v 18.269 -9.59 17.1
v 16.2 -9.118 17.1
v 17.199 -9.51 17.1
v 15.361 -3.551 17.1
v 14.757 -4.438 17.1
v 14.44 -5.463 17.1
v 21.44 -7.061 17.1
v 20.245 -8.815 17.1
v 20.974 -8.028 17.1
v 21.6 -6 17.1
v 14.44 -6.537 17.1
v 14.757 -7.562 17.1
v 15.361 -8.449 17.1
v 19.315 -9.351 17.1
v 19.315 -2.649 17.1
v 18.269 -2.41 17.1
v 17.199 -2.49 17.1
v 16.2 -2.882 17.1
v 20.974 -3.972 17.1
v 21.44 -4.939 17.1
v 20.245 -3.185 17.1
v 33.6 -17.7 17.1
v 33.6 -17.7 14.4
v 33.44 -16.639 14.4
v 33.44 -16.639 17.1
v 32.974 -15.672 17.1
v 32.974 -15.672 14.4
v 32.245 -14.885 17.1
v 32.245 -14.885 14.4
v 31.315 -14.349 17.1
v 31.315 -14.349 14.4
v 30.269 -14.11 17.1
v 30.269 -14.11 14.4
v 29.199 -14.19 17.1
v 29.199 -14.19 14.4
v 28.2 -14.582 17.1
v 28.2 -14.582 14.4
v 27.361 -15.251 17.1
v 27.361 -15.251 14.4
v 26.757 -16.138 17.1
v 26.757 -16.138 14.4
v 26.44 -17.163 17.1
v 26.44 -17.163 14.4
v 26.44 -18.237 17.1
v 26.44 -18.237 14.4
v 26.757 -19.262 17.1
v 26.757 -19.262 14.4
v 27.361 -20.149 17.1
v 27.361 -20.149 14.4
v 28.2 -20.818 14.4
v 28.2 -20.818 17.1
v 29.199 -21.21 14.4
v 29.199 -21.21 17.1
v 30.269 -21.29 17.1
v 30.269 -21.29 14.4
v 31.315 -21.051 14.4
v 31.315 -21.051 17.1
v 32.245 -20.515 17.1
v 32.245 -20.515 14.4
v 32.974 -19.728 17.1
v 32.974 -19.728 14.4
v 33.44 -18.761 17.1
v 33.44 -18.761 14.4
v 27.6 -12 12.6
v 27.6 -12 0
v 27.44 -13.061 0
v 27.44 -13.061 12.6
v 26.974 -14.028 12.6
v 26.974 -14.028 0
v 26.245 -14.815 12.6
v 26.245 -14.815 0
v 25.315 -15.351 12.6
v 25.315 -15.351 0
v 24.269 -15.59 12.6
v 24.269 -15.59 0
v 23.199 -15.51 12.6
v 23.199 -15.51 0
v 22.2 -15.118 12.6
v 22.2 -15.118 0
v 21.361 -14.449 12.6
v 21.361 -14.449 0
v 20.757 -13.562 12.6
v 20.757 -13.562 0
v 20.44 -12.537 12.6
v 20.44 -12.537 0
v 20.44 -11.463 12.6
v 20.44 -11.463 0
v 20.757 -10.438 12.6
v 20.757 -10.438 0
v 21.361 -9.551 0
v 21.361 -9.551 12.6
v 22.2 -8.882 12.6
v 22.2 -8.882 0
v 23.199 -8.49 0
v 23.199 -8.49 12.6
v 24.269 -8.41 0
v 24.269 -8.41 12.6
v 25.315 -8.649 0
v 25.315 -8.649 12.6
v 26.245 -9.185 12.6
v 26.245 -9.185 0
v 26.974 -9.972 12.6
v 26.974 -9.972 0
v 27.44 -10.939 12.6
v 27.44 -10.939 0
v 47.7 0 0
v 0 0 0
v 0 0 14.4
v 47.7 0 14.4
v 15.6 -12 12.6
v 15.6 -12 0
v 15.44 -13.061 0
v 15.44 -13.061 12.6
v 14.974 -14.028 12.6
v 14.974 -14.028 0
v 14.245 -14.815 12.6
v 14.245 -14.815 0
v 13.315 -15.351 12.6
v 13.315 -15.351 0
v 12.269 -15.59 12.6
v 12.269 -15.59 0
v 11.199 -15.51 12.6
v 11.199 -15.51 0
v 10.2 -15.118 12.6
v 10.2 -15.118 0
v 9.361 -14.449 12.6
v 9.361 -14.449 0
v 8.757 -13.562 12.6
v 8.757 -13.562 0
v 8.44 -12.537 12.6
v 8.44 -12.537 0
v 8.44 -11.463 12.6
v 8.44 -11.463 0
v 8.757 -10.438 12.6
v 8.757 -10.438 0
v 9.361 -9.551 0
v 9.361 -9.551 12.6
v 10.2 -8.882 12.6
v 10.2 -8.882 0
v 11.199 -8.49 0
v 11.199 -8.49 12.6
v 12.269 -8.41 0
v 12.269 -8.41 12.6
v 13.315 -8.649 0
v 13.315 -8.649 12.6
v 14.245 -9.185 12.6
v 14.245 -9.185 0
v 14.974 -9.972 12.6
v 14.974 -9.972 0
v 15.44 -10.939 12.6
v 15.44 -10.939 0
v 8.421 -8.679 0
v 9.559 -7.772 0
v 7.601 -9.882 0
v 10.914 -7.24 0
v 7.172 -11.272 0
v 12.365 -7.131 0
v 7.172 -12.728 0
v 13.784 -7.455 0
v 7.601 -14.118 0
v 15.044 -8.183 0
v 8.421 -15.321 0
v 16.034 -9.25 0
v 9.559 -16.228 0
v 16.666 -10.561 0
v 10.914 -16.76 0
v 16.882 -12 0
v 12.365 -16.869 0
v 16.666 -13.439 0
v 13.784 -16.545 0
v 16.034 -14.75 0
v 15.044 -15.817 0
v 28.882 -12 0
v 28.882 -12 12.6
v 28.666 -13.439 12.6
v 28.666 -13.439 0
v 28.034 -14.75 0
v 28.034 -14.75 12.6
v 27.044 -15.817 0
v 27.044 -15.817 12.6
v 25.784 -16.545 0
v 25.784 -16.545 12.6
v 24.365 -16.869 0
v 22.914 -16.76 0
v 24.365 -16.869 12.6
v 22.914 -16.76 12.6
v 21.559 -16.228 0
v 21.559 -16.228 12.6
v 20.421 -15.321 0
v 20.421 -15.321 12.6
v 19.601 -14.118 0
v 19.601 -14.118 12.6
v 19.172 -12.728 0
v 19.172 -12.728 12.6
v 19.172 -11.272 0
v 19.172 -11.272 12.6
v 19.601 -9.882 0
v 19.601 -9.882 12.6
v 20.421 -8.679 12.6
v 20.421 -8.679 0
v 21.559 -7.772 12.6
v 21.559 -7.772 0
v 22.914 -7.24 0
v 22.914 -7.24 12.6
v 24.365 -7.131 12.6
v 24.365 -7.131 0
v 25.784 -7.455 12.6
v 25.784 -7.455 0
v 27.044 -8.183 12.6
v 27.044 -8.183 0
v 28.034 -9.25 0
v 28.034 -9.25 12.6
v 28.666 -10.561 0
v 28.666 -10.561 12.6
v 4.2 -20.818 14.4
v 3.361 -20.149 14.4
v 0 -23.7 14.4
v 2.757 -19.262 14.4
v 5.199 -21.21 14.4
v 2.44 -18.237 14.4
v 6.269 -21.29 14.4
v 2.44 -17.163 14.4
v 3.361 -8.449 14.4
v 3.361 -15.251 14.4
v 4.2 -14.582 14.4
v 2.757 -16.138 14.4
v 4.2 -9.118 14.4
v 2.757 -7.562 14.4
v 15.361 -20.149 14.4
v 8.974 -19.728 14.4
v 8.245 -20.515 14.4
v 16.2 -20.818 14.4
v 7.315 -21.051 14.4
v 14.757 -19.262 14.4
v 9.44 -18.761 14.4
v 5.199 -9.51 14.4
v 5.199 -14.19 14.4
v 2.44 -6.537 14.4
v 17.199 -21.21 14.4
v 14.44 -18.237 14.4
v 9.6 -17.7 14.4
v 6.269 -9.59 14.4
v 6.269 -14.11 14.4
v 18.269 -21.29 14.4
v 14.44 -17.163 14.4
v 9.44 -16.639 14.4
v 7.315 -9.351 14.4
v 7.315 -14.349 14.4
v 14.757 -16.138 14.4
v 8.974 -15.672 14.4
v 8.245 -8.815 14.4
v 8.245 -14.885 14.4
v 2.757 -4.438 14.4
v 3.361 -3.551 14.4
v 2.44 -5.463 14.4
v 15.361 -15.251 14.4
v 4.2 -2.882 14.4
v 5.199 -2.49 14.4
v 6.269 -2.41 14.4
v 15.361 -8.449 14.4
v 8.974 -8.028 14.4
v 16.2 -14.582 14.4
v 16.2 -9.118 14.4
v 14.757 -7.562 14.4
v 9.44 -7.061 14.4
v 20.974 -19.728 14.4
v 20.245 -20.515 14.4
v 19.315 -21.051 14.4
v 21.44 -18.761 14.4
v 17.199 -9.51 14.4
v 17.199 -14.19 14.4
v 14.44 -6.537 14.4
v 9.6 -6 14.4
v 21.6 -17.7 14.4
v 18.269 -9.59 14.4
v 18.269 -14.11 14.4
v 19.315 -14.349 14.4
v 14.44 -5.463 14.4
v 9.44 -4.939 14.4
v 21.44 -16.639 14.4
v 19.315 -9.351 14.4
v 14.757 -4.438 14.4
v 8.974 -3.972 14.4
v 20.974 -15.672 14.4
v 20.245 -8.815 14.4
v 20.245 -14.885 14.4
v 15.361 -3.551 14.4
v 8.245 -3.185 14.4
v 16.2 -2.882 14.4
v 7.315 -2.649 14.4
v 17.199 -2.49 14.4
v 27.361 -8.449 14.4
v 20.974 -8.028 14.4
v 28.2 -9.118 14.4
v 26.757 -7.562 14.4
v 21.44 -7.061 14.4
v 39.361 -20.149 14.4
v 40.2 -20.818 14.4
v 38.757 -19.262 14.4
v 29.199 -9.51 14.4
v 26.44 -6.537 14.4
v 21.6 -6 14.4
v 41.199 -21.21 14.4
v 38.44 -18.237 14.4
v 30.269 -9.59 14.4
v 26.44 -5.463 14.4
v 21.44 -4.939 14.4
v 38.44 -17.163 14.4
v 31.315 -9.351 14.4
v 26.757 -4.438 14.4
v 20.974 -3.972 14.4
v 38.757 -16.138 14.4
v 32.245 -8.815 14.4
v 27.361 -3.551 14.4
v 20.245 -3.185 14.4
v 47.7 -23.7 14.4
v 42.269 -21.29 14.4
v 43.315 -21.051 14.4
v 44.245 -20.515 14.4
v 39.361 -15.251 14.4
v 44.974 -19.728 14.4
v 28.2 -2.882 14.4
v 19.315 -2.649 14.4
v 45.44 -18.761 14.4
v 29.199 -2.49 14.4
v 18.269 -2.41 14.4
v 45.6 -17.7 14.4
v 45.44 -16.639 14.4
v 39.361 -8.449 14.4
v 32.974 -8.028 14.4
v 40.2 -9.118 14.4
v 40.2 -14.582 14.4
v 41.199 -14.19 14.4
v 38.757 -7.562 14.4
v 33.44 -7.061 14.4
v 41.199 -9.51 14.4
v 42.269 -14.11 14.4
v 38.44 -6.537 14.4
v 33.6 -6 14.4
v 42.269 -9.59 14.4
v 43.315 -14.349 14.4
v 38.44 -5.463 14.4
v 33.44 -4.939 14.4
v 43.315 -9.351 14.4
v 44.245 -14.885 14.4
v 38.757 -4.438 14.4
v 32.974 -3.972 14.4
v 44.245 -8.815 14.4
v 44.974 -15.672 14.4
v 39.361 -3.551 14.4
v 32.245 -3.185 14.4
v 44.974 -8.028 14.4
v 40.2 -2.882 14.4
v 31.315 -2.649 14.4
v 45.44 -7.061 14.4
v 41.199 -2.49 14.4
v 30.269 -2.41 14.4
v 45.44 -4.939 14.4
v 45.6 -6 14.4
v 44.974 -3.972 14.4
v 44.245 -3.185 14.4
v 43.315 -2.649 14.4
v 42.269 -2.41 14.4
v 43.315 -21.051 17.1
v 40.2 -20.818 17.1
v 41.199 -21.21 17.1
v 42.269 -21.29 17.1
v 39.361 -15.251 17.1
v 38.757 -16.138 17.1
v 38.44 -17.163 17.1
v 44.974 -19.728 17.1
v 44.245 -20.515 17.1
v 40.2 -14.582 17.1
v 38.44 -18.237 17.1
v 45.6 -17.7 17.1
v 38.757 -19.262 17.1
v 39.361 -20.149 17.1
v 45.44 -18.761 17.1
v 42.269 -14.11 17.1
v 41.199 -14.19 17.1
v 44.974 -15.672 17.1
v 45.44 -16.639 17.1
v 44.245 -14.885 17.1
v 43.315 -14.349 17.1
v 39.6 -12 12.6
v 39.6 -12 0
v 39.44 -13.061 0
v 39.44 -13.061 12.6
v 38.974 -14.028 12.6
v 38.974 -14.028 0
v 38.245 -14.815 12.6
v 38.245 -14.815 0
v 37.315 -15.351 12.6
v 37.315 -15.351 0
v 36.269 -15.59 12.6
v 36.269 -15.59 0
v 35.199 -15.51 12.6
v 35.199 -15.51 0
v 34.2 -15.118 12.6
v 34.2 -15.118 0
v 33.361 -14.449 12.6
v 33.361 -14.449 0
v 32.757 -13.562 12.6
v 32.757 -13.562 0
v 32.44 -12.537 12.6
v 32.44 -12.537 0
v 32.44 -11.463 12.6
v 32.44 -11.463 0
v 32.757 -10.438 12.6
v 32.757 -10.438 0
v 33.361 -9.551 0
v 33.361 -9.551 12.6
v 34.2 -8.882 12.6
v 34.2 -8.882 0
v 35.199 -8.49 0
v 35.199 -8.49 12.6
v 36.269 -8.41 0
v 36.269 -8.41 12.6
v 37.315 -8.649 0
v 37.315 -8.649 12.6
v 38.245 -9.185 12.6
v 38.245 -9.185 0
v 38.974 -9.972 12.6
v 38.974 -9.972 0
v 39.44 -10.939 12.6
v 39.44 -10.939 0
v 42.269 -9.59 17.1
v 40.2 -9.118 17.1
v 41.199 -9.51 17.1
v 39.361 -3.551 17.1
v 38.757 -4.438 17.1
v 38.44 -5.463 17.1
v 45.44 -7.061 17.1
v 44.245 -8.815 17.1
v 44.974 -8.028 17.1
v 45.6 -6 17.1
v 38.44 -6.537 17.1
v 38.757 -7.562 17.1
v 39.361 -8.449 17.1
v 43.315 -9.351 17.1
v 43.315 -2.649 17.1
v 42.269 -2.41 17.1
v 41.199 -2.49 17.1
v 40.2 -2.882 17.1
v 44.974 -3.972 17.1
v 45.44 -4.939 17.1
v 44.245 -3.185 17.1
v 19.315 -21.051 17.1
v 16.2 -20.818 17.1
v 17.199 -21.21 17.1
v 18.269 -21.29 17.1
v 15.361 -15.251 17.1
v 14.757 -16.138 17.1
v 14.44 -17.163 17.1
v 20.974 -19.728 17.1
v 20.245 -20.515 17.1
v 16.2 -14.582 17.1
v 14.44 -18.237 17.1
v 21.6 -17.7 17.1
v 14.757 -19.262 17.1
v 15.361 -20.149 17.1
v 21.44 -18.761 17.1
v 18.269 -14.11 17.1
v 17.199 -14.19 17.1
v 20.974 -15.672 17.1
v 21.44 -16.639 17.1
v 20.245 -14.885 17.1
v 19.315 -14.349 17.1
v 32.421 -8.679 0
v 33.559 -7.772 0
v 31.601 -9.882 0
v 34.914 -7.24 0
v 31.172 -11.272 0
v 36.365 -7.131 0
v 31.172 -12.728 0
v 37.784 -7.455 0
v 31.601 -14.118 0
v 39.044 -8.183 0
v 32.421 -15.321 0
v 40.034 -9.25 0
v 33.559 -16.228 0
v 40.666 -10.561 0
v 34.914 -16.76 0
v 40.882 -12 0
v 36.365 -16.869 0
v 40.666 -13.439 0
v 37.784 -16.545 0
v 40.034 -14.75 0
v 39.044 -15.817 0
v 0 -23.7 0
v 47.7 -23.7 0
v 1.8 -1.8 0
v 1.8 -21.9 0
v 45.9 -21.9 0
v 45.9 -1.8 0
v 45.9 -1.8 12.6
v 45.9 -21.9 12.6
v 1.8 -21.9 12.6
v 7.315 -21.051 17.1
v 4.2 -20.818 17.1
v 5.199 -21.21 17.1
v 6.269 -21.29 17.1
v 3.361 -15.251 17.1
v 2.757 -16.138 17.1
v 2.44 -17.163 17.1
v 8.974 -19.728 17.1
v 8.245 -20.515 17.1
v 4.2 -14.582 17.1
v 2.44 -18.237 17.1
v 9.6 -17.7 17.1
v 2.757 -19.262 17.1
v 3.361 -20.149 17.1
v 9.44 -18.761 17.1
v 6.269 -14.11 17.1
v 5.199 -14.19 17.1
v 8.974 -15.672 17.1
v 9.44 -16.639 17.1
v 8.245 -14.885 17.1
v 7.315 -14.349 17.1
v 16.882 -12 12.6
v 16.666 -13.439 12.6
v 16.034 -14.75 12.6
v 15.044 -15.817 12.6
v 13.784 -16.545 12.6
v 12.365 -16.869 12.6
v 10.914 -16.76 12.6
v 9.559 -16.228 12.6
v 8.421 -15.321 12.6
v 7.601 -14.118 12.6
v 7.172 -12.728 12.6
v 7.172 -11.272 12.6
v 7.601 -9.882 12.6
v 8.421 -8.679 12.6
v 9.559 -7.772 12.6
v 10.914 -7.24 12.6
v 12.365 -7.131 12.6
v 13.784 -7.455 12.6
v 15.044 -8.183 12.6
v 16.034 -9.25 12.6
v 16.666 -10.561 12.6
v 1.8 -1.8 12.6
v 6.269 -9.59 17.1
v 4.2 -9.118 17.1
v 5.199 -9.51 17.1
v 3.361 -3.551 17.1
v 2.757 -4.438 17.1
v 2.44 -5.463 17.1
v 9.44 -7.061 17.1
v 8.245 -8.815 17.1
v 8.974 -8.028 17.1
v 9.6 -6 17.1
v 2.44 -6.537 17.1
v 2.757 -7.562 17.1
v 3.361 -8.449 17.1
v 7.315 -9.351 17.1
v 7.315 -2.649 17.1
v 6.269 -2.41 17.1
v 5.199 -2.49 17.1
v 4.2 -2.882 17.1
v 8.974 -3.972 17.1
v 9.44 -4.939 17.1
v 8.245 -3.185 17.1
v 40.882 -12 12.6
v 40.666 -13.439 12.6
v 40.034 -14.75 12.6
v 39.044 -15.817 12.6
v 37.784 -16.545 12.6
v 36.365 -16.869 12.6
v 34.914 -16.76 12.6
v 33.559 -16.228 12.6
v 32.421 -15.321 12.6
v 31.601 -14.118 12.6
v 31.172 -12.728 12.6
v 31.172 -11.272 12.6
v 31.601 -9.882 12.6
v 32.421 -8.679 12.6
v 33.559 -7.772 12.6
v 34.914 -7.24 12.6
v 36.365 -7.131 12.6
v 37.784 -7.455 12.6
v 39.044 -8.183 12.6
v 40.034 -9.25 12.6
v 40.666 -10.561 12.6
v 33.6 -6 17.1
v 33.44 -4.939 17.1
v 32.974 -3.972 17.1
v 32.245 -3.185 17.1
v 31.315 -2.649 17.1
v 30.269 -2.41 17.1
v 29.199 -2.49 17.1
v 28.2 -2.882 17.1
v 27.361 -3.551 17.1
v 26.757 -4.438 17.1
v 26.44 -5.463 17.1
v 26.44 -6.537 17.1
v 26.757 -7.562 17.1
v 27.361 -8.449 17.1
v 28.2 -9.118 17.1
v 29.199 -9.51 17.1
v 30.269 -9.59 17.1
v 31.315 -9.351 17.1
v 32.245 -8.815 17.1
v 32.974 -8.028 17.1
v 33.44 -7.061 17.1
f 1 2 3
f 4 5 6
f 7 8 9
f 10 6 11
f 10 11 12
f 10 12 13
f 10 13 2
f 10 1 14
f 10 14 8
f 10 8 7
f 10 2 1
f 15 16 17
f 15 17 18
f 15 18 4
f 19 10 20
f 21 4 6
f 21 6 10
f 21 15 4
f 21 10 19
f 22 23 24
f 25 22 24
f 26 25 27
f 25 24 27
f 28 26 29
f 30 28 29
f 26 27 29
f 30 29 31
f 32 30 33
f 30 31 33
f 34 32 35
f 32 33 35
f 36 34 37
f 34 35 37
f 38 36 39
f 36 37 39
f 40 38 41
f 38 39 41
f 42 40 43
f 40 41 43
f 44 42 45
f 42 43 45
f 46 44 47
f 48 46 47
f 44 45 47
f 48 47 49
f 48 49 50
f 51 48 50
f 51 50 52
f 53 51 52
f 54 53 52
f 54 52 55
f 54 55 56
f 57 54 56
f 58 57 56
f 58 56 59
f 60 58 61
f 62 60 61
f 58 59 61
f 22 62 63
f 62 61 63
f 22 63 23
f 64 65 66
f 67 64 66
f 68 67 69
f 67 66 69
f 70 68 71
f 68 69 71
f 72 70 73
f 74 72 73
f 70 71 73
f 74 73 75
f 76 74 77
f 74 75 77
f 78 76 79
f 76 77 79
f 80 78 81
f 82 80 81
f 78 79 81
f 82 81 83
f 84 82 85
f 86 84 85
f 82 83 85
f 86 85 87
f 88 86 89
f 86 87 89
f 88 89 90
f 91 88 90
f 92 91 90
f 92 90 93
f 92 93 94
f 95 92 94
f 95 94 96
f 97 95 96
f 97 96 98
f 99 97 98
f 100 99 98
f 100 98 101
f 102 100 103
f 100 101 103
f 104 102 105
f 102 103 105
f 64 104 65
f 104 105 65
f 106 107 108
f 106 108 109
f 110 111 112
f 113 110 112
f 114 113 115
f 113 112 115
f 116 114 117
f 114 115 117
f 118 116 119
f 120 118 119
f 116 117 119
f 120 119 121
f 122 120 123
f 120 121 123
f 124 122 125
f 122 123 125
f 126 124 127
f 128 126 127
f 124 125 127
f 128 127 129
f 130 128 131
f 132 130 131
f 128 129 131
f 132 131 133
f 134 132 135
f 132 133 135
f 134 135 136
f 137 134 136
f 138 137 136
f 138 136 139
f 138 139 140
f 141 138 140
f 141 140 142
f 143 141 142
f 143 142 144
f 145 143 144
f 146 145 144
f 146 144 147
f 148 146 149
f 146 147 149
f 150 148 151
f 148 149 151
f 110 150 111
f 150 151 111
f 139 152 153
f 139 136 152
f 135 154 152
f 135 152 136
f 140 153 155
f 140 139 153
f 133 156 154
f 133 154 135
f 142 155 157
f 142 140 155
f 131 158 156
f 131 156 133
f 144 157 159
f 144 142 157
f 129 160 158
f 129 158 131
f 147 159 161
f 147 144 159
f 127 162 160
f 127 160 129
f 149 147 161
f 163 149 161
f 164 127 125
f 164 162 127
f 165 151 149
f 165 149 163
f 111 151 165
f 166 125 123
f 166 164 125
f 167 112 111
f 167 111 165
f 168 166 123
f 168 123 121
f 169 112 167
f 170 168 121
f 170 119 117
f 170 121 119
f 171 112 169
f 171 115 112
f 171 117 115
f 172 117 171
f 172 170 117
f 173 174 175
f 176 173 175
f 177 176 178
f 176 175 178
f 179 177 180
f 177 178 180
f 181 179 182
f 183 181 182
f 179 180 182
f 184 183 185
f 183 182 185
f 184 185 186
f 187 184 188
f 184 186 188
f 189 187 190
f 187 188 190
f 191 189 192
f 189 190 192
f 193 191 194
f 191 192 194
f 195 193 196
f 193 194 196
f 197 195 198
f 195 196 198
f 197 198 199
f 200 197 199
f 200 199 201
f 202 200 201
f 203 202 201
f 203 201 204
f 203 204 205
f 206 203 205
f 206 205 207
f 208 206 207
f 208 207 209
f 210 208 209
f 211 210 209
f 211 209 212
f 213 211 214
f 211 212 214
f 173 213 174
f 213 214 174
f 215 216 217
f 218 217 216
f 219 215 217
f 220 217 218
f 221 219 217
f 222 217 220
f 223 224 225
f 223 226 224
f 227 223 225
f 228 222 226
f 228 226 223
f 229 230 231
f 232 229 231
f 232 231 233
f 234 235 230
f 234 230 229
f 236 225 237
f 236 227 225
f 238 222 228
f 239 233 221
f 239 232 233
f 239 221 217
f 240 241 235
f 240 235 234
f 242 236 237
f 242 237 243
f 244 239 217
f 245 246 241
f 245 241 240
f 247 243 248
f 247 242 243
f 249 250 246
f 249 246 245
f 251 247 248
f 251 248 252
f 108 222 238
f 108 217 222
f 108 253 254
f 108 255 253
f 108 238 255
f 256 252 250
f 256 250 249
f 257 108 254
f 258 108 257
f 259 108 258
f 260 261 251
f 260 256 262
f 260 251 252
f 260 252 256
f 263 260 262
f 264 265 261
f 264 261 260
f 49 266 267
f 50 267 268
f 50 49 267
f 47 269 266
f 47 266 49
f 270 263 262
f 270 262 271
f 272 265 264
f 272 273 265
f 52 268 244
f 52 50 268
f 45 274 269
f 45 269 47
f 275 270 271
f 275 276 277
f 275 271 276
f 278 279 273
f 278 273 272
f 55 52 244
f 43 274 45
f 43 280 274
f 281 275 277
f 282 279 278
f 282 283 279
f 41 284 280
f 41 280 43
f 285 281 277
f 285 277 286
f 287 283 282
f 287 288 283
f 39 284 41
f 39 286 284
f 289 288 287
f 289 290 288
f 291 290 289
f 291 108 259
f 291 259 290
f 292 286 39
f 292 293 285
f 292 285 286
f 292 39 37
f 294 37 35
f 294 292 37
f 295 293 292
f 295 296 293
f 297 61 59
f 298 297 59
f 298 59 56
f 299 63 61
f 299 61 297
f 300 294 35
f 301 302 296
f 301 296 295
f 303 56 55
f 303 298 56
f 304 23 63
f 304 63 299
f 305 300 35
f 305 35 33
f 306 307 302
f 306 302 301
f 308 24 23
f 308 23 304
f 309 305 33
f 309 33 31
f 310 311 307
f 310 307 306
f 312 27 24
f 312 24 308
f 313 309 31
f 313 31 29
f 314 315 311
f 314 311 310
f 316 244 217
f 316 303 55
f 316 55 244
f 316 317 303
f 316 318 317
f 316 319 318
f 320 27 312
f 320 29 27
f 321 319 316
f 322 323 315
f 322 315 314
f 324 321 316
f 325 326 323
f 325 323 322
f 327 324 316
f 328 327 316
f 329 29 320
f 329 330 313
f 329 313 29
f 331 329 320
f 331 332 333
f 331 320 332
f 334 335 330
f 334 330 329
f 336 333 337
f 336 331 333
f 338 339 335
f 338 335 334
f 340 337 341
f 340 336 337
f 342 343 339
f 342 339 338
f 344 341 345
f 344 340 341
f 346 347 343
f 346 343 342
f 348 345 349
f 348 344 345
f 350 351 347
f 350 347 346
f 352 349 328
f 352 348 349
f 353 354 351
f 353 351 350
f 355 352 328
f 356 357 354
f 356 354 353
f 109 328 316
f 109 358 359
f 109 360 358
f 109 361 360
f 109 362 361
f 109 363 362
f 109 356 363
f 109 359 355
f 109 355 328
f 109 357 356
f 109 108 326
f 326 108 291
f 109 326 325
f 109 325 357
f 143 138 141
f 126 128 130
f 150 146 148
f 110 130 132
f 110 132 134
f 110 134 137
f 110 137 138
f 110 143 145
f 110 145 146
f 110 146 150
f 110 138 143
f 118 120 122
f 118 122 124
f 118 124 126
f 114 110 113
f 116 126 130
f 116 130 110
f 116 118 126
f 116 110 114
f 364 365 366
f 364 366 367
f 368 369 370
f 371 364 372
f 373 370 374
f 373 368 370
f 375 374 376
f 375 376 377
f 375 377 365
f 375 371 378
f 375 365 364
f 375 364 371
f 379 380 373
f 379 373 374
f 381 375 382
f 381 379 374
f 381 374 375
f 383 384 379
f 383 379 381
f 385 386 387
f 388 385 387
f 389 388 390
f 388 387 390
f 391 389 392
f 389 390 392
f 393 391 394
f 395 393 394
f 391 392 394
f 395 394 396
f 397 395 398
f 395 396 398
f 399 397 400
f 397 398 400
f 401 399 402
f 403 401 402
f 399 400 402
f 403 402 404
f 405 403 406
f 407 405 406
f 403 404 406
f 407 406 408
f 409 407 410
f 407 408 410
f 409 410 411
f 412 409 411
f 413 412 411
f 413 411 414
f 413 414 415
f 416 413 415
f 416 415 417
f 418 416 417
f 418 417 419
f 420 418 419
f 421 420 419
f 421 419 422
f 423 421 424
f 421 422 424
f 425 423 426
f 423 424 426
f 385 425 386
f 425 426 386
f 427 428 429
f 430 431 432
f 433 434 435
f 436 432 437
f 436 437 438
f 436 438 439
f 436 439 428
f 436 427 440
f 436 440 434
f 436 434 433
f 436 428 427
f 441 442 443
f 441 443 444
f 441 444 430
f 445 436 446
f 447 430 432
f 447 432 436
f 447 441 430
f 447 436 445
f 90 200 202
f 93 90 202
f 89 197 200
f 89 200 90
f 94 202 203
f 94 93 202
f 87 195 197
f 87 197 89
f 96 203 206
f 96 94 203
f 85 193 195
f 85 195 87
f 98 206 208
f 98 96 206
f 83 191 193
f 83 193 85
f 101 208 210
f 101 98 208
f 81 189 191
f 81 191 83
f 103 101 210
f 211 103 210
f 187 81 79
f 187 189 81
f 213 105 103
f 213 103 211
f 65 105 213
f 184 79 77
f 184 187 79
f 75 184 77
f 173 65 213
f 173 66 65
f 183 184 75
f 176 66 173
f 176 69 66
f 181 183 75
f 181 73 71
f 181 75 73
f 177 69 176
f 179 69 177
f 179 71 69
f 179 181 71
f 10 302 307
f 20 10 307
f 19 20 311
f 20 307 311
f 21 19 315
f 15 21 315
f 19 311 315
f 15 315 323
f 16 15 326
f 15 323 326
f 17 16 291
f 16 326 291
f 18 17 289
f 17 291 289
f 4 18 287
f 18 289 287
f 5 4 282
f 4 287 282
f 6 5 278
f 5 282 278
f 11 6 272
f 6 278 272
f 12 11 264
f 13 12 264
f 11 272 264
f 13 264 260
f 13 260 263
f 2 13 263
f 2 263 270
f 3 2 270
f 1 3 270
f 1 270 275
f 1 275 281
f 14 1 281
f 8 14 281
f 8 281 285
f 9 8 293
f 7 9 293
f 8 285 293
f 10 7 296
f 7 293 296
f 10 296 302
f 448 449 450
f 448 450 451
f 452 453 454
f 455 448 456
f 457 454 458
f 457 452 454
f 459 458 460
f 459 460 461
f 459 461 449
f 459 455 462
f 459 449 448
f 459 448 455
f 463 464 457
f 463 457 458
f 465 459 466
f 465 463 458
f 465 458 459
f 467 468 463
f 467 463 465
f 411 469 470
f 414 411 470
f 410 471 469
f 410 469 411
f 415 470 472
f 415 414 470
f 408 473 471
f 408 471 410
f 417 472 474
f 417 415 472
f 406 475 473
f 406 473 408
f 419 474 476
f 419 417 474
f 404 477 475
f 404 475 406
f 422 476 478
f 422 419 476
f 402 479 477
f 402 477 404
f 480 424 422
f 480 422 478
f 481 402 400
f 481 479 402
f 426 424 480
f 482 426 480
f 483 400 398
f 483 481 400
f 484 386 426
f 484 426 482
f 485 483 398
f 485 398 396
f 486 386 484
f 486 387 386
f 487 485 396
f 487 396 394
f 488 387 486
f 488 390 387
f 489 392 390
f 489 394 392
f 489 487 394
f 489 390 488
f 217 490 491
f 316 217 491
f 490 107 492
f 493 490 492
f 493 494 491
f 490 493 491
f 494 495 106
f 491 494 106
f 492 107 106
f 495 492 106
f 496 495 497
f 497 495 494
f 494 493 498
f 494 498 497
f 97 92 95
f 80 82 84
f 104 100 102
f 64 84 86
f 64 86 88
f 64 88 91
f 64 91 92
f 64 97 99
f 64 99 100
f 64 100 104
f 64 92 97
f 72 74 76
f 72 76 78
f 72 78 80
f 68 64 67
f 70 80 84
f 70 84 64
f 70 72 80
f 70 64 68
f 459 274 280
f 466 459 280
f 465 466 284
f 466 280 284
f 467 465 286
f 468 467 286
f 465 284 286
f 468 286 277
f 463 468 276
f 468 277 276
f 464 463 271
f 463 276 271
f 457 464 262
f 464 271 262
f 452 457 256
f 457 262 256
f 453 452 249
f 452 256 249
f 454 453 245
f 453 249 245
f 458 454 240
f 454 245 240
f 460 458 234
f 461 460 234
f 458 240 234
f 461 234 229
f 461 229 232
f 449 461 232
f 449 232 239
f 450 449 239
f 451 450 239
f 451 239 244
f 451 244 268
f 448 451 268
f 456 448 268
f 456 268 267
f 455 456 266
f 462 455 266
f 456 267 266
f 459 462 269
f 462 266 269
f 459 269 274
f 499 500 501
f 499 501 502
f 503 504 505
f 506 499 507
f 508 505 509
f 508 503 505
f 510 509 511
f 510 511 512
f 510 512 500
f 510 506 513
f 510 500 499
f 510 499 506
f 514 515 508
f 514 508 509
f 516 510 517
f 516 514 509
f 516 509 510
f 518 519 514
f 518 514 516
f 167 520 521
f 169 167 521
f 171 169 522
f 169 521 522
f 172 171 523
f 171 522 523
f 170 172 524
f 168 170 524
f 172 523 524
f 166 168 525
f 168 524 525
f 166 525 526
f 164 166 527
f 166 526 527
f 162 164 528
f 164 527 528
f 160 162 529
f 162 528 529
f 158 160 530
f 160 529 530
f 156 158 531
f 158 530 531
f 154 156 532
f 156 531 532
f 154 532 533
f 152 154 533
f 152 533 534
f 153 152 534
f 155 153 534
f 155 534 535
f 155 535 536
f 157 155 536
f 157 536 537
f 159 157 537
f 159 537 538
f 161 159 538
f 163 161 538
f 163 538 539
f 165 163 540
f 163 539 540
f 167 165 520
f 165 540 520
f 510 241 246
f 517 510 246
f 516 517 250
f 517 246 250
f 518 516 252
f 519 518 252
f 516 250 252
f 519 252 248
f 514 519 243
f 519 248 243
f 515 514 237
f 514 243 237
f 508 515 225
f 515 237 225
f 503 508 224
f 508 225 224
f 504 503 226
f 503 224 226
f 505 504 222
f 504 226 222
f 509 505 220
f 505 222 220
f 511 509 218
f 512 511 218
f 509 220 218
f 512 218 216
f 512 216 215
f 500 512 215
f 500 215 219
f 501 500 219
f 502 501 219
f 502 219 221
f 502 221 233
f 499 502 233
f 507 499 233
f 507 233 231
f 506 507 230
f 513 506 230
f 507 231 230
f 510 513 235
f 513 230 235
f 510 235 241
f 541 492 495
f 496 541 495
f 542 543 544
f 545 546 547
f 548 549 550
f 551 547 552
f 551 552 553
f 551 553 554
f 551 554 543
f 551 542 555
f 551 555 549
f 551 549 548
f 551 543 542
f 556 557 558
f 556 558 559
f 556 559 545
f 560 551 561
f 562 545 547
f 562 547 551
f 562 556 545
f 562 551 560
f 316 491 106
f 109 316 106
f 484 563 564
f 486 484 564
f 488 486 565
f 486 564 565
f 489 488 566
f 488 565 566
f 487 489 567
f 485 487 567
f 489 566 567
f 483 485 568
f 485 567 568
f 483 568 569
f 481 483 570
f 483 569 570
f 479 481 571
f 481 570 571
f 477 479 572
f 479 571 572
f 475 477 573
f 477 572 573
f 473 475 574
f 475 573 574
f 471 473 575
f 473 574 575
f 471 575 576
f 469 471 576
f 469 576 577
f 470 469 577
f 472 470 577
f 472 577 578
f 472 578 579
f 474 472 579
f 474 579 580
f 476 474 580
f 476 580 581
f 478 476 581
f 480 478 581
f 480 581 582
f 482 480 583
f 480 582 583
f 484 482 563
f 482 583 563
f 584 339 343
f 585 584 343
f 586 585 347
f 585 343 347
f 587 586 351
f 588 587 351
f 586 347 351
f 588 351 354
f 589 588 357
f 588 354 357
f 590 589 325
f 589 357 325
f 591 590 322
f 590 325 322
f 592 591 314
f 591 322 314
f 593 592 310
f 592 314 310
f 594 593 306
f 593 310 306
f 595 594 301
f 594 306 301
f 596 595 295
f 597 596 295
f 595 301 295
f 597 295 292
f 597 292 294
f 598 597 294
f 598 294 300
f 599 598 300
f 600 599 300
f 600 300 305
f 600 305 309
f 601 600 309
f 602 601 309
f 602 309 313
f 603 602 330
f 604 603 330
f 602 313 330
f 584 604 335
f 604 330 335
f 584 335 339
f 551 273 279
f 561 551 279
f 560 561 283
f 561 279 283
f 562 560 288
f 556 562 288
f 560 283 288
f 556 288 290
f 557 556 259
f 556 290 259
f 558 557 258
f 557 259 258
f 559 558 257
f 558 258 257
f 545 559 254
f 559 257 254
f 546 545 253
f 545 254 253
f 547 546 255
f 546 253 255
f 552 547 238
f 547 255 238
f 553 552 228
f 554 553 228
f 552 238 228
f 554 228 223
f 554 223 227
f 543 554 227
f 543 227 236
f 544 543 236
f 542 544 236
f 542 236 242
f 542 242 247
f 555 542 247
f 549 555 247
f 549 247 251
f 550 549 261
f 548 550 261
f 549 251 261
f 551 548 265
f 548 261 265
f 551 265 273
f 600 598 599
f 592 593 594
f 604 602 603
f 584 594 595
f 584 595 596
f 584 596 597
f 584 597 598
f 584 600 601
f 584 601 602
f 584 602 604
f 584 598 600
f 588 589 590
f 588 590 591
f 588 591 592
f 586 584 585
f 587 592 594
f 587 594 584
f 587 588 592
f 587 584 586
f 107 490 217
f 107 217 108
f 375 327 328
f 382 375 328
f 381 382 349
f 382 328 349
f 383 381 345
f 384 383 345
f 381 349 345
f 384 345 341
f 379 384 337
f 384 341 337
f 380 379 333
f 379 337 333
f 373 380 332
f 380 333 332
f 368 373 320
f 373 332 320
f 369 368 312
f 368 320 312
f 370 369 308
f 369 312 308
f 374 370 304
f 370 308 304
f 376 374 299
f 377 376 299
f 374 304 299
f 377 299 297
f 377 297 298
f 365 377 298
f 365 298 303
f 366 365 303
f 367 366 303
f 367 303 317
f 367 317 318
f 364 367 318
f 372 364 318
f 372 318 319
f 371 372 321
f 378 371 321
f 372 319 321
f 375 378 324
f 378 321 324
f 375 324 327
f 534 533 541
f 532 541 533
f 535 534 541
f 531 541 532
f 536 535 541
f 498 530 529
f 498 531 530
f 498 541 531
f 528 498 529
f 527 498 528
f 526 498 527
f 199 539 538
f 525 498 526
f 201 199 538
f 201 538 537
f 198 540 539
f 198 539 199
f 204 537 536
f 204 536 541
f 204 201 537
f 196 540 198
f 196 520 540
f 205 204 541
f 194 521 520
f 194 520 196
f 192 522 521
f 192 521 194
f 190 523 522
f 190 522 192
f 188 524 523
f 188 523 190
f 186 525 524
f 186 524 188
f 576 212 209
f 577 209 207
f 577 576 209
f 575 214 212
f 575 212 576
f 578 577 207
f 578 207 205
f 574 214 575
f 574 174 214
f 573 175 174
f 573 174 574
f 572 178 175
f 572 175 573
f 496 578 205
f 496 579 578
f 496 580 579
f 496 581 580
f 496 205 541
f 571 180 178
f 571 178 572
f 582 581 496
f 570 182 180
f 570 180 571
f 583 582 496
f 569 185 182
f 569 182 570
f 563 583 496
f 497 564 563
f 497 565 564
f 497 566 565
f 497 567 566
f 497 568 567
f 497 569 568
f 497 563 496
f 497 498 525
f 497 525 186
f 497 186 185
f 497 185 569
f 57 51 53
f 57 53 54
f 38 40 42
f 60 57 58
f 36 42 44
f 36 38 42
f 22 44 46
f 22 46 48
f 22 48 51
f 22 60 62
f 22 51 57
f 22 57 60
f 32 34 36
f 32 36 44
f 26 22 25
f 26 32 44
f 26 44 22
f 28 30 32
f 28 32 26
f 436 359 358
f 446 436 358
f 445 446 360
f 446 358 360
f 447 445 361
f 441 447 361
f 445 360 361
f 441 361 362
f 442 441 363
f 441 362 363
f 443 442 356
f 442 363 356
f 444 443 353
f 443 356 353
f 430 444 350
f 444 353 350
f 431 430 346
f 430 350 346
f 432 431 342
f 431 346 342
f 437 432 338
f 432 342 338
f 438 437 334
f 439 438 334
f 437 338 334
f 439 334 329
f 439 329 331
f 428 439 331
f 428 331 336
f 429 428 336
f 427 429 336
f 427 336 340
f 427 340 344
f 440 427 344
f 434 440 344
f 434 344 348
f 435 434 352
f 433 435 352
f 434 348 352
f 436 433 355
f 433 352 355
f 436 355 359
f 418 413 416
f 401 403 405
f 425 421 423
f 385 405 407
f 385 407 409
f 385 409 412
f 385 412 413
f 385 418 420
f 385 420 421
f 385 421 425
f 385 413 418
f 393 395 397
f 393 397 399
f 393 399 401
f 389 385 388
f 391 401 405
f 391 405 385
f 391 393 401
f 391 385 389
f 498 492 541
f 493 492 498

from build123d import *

# Parameters (mm, degrees)
SKETCH_W               = 47.7
SKETCH_H               = 23.7
PAD_DEPTH              = 14.4
SKETCH001_W            = 44.1
SKETCH001_H            = 20.1
POCKET_DEPTH           = 12.6
SKETCH002_R            = 3.6
PAD001_DEPTH           = 2.7
LINEARPATTERN_COUNT    = 4
LINEARPATTERN_PITCH    = 12
SKETCH003_R            = 4.8825
PAD002_DEPTH           = 12.6
LINEARPATTERN001_COUNT = 3
LINEARPATTERN001_PITCH = 12
SKETCH004_R            = 3.6
POCKET001_DEPTH        = 12.6
LINEARPATTERN002_COUNT = 3
LINEARPATTERN002_PITCH = 12


with BuildPart() as part:
    # Sketch → Pad (new body)
    with BuildSketch(Plane.XY):
        with Locations((23.85, -11.85)):
            Rectangle(SKETCH_W, SKETCH_H)
    extrude(amount=PAD_DEPTH)

    # Sketch001 (on Face5 of Pad) → Pocket (cut)
    with BuildSketch(Plane(origin=(0, 0, 0), x_dir=(1, 0, 0), z_dir=(0, 0, -1))):
        with Locations((23.85, 11.85)):
            Rectangle(SKETCH001_W, SKETCH001_H)
    extrude(amount=-POCKET_DEPTH, mode=Mode.SUBTRACT)

    # Sketch002 (on Face5 of Pocket) → Pad001 (join)
    with BuildSketch(Plane.XY.offset(14.4)):
        with Locations((6, -6)):
            Circle(SKETCH002_R)
        with Locations((6, -17.7)):
            Circle(SKETCH002_R)
    pad001 = extrude(amount=PAD001_DEPTH)

    # LinearPattern: Pad001 ×4
    with Locations(*[(i * LINEARPATTERN_PITCH, 0, 0) for i in range(1, LINEARPATTERN_COUNT)]):
        add(pad001)

    # Sketch003 (on Face19 of LinearPattern) → Pad002 (join)
    with BuildSketch(Plane(origin=(0, 0, 12.6), x_dir=(1, 0, 0), z_dir=(0, 0, -1))):
        with Locations((12, 12)):
            Circle(SKETCH003_R)
    pad002 = extrude(amount=PAD002_DEPTH)

    # LinearPattern001: Pad002 ×3
    with Locations(*[(i * LINEARPATTERN001_PITCH, 0, 0) for i in range(1, LINEARPATTERN001_COUNT)]):
        add(pad002)

    # Sketch004 (on Face31 of LinearPattern001) → Pocket001 (cut)
    with BuildSketch(Plane(origin=(0, 0, 0), x_dir=(1, 0, 0), z_dir=(0, 0, -1))):
        with Locations((12, 12)):
            Circle(SKETCH004_R)
    pocket001 = extrude(amount=-POCKET001_DEPTH, mode=Mode.SUBTRACT)

    # LinearPattern002: Pocket001 ×3
    with Locations(*[(i * LINEARPATTERN002_PITCH, 0, 0) for i in range(1, LINEARPATTERN002_COUNT)]):
        add(pocket001, mode=Mode.SUBTRACT)


solid = part.part
